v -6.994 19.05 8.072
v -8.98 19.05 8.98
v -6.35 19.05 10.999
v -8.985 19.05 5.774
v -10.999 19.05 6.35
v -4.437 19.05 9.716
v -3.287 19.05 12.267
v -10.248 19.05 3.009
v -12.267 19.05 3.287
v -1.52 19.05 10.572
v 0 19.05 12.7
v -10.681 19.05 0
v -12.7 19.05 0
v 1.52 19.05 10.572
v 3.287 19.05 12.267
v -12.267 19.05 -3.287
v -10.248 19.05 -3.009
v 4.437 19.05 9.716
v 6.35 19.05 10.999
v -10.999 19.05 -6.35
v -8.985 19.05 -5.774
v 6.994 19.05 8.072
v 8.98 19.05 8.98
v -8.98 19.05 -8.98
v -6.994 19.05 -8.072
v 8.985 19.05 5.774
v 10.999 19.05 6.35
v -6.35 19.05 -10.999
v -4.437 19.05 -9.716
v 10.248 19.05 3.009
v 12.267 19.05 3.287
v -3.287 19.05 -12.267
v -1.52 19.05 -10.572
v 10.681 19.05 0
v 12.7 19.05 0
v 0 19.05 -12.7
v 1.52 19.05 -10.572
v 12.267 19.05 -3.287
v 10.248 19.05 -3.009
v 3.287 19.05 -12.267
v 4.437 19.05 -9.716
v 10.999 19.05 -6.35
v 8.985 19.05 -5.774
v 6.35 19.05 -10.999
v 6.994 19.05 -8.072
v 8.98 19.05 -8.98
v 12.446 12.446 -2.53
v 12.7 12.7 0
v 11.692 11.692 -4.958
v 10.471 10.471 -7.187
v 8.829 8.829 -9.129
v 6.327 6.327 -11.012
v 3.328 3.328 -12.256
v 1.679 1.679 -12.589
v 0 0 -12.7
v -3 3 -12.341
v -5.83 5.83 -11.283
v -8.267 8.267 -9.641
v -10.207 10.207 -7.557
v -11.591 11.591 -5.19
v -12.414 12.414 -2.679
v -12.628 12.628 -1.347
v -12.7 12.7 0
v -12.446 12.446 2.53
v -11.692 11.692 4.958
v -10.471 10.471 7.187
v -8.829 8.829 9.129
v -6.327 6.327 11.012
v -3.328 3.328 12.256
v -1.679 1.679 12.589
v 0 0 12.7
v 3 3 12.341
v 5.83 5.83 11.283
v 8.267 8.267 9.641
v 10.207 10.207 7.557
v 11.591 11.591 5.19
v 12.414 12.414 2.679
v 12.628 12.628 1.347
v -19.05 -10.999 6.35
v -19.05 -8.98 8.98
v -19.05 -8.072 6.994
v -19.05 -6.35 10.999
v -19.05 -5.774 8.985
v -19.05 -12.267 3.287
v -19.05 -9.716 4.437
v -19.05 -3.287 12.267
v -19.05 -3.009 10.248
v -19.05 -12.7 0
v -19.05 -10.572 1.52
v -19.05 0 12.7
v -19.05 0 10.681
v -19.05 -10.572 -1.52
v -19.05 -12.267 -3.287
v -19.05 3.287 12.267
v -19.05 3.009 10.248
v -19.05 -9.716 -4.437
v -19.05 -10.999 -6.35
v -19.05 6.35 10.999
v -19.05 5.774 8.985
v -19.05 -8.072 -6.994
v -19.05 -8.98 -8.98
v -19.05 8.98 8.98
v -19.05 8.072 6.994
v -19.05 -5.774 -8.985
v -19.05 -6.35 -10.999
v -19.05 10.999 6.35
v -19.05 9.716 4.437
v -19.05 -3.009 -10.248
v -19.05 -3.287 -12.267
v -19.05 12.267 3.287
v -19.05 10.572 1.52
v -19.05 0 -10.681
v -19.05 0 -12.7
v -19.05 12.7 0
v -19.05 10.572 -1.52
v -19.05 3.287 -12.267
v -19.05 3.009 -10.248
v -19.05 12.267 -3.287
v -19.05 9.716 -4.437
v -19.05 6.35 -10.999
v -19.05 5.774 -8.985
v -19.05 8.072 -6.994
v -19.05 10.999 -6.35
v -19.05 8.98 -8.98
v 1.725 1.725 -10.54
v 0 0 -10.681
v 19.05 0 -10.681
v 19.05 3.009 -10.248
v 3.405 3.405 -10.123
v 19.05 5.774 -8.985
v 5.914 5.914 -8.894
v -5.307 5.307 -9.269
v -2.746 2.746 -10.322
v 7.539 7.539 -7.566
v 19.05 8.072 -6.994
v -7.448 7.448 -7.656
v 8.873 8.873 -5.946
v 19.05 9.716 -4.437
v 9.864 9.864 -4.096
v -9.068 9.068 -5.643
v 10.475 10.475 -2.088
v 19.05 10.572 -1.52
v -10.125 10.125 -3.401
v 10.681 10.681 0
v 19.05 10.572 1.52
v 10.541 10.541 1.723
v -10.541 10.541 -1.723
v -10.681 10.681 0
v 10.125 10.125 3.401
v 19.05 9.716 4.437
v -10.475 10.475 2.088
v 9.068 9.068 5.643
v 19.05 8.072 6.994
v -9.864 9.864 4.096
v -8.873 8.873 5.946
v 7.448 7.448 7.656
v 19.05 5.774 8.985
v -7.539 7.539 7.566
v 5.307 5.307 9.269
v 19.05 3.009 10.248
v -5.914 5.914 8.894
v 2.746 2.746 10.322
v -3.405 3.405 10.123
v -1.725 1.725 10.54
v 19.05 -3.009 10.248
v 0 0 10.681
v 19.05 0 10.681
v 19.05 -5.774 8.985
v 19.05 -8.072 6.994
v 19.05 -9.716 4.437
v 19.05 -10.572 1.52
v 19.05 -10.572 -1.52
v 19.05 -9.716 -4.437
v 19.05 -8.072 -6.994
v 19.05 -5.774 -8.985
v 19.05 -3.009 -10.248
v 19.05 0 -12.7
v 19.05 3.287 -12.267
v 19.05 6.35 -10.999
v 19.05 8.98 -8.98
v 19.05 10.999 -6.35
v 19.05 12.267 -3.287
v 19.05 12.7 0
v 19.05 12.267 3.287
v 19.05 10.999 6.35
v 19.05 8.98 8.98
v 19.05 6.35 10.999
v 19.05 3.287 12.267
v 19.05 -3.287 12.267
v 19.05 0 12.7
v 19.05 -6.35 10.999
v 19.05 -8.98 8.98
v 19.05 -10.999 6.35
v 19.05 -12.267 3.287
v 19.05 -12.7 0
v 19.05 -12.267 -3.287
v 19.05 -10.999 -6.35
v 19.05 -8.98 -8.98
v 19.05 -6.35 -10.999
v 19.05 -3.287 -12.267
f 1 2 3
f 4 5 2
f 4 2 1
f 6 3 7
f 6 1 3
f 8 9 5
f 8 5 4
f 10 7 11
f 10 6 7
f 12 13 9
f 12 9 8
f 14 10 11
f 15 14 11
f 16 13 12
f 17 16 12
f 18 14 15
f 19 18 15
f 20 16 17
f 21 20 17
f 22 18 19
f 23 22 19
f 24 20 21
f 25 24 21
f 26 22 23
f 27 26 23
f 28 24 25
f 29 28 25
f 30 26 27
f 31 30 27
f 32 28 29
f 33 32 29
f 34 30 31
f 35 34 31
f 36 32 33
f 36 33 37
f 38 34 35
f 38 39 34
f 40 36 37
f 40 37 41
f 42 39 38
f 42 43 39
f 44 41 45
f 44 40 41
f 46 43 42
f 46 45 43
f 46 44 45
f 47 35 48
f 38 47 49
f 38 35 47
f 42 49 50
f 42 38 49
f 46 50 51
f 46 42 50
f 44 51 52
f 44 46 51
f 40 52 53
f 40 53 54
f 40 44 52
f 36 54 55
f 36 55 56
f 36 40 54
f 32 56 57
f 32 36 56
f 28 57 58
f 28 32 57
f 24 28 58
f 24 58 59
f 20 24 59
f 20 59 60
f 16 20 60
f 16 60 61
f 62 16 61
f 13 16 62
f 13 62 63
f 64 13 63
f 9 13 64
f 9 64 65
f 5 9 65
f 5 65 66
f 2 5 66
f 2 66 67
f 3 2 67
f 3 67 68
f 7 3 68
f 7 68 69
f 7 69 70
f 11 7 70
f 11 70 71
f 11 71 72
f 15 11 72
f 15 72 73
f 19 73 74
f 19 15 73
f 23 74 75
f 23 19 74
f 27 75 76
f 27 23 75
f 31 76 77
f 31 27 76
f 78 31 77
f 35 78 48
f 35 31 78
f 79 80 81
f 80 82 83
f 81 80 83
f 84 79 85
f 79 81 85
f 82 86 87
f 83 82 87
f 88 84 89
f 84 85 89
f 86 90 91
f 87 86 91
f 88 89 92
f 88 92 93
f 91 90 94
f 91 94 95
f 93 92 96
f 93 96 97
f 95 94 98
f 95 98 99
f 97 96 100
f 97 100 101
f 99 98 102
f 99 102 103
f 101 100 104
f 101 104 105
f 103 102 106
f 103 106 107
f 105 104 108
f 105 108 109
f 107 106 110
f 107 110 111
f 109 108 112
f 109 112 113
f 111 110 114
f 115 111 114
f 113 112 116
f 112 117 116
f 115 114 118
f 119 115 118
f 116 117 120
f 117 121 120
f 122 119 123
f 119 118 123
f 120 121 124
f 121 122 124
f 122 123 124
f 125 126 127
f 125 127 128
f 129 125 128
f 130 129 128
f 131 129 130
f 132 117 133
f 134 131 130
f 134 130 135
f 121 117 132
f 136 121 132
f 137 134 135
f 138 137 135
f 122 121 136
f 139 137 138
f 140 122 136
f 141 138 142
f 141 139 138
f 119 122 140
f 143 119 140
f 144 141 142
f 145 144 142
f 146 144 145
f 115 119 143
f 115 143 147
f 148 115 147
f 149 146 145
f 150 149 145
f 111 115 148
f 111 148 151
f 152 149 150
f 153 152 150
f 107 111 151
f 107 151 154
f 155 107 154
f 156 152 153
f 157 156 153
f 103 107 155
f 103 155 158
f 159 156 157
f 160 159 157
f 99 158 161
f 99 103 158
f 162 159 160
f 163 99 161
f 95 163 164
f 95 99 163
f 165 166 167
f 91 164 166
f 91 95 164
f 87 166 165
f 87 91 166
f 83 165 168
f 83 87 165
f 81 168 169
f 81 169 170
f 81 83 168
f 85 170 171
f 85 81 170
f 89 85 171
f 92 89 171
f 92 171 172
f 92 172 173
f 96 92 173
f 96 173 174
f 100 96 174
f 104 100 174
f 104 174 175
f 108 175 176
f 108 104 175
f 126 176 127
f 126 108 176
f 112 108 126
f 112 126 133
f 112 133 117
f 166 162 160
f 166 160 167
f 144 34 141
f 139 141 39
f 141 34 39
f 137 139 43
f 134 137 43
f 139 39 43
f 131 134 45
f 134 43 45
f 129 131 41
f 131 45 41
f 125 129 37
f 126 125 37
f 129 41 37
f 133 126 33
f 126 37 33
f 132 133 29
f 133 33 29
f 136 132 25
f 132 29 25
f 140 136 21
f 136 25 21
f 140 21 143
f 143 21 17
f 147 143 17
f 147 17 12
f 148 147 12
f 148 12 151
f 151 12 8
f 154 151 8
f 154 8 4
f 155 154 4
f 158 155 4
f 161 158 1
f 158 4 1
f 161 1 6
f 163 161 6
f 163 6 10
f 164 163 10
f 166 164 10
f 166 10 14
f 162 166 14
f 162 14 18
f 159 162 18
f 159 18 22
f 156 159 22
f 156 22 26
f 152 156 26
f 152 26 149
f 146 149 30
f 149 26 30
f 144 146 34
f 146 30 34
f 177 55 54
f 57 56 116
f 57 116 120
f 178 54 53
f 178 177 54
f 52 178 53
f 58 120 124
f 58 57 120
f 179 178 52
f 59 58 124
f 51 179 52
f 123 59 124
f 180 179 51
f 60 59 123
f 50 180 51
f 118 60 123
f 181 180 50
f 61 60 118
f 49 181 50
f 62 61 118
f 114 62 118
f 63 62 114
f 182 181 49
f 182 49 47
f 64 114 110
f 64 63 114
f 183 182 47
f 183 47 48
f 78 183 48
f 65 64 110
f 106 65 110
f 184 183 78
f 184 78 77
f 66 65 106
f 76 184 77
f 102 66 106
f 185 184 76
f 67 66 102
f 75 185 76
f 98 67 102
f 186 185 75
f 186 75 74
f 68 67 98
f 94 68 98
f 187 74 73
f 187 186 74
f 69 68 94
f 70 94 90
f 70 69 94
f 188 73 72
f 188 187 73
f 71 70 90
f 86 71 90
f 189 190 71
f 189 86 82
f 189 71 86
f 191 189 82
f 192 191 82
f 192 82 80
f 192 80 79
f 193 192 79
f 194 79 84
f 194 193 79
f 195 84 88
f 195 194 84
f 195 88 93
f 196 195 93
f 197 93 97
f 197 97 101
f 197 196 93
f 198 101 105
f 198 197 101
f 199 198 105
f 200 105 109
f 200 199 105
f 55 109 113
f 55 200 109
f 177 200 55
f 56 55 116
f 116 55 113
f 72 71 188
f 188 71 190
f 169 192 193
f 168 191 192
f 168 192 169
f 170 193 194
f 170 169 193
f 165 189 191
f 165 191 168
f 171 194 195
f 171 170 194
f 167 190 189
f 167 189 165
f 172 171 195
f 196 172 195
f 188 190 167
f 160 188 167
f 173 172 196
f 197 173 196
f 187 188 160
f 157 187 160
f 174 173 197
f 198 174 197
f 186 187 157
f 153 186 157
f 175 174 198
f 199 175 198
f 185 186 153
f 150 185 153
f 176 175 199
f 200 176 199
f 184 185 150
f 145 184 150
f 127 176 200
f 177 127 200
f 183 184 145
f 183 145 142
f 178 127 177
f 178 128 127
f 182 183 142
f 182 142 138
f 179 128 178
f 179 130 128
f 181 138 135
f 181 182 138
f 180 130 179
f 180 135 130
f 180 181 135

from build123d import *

# Parameters (mm, degrees)
SKETCH2_R           = 12.7
SKETCH2_R_2         = 10.6807
BOSS_EXTRUDE1_DEPTH = 19.05
BOSS_EXTRUDE2_REACH = 33.75
SKETCH5_R           = 12.7
CUT_EXTRUDE1_REACH  = 33.75
SKETCH6_R           = 10.6807


with BuildPart() as part:
    # Sketch2 → Boss-Extrude1 (new body, symmetric)
    with BuildSketch(Plane(origin=(0, 0, 0), x_dir=(0, 0, -1), z_dir=(1, 0, 0))):
        Circle(SKETCH2_R)
        Circle(SKETCH2_R_2, mode=Mode.SUBTRACT)
    extrude(amount=BOSS_EXTRUDE1_DEPTH, both=True)

    # Sketch5 → Boss-Extrude2 (add, up to next)
    with BuildSketch(Plane(origin=(0, 19.05, 0), x_dir=(1, 0, 0), z_dir=(0, 1, 0)), mode=Mode.PRIVATE) as boss_extrude2_sk1:
        Circle(SKETCH5_R)
    boss_extrude2_tool1 = extrude(boss_extrude2_sk1.sketch, amount=-BOSS_EXTRUDE2_REACH, mode=Mode.PRIVATE) - part.part
    add(boss_extrude2_tool1.solids().sort_by_distance((0, 19.05, 0))[0])

    # Sketch6 → Cut-Extrude1 (cut, up to next)
    with BuildSketch(Plane(origin=(0, 19.05, 0), x_dir=(1, 0, 0), z_dir=(0, 1, 0)), mode=Mode.PRIVATE) as cut_extrude1_sk1:
        Circle(SKETCH6_R)
    cut_extrude1_tool1 = extrude(cut_extrude1_sk1.sketch, amount=-CUT_EXTRUDE1_REACH, mode=Mode.PRIVATE) & part.part
    add(cut_extrude1_tool1.solids().sort_by_distance((0, 19.05, 0))[0], mode=Mode.SUBTRACT)


solid = part.part
